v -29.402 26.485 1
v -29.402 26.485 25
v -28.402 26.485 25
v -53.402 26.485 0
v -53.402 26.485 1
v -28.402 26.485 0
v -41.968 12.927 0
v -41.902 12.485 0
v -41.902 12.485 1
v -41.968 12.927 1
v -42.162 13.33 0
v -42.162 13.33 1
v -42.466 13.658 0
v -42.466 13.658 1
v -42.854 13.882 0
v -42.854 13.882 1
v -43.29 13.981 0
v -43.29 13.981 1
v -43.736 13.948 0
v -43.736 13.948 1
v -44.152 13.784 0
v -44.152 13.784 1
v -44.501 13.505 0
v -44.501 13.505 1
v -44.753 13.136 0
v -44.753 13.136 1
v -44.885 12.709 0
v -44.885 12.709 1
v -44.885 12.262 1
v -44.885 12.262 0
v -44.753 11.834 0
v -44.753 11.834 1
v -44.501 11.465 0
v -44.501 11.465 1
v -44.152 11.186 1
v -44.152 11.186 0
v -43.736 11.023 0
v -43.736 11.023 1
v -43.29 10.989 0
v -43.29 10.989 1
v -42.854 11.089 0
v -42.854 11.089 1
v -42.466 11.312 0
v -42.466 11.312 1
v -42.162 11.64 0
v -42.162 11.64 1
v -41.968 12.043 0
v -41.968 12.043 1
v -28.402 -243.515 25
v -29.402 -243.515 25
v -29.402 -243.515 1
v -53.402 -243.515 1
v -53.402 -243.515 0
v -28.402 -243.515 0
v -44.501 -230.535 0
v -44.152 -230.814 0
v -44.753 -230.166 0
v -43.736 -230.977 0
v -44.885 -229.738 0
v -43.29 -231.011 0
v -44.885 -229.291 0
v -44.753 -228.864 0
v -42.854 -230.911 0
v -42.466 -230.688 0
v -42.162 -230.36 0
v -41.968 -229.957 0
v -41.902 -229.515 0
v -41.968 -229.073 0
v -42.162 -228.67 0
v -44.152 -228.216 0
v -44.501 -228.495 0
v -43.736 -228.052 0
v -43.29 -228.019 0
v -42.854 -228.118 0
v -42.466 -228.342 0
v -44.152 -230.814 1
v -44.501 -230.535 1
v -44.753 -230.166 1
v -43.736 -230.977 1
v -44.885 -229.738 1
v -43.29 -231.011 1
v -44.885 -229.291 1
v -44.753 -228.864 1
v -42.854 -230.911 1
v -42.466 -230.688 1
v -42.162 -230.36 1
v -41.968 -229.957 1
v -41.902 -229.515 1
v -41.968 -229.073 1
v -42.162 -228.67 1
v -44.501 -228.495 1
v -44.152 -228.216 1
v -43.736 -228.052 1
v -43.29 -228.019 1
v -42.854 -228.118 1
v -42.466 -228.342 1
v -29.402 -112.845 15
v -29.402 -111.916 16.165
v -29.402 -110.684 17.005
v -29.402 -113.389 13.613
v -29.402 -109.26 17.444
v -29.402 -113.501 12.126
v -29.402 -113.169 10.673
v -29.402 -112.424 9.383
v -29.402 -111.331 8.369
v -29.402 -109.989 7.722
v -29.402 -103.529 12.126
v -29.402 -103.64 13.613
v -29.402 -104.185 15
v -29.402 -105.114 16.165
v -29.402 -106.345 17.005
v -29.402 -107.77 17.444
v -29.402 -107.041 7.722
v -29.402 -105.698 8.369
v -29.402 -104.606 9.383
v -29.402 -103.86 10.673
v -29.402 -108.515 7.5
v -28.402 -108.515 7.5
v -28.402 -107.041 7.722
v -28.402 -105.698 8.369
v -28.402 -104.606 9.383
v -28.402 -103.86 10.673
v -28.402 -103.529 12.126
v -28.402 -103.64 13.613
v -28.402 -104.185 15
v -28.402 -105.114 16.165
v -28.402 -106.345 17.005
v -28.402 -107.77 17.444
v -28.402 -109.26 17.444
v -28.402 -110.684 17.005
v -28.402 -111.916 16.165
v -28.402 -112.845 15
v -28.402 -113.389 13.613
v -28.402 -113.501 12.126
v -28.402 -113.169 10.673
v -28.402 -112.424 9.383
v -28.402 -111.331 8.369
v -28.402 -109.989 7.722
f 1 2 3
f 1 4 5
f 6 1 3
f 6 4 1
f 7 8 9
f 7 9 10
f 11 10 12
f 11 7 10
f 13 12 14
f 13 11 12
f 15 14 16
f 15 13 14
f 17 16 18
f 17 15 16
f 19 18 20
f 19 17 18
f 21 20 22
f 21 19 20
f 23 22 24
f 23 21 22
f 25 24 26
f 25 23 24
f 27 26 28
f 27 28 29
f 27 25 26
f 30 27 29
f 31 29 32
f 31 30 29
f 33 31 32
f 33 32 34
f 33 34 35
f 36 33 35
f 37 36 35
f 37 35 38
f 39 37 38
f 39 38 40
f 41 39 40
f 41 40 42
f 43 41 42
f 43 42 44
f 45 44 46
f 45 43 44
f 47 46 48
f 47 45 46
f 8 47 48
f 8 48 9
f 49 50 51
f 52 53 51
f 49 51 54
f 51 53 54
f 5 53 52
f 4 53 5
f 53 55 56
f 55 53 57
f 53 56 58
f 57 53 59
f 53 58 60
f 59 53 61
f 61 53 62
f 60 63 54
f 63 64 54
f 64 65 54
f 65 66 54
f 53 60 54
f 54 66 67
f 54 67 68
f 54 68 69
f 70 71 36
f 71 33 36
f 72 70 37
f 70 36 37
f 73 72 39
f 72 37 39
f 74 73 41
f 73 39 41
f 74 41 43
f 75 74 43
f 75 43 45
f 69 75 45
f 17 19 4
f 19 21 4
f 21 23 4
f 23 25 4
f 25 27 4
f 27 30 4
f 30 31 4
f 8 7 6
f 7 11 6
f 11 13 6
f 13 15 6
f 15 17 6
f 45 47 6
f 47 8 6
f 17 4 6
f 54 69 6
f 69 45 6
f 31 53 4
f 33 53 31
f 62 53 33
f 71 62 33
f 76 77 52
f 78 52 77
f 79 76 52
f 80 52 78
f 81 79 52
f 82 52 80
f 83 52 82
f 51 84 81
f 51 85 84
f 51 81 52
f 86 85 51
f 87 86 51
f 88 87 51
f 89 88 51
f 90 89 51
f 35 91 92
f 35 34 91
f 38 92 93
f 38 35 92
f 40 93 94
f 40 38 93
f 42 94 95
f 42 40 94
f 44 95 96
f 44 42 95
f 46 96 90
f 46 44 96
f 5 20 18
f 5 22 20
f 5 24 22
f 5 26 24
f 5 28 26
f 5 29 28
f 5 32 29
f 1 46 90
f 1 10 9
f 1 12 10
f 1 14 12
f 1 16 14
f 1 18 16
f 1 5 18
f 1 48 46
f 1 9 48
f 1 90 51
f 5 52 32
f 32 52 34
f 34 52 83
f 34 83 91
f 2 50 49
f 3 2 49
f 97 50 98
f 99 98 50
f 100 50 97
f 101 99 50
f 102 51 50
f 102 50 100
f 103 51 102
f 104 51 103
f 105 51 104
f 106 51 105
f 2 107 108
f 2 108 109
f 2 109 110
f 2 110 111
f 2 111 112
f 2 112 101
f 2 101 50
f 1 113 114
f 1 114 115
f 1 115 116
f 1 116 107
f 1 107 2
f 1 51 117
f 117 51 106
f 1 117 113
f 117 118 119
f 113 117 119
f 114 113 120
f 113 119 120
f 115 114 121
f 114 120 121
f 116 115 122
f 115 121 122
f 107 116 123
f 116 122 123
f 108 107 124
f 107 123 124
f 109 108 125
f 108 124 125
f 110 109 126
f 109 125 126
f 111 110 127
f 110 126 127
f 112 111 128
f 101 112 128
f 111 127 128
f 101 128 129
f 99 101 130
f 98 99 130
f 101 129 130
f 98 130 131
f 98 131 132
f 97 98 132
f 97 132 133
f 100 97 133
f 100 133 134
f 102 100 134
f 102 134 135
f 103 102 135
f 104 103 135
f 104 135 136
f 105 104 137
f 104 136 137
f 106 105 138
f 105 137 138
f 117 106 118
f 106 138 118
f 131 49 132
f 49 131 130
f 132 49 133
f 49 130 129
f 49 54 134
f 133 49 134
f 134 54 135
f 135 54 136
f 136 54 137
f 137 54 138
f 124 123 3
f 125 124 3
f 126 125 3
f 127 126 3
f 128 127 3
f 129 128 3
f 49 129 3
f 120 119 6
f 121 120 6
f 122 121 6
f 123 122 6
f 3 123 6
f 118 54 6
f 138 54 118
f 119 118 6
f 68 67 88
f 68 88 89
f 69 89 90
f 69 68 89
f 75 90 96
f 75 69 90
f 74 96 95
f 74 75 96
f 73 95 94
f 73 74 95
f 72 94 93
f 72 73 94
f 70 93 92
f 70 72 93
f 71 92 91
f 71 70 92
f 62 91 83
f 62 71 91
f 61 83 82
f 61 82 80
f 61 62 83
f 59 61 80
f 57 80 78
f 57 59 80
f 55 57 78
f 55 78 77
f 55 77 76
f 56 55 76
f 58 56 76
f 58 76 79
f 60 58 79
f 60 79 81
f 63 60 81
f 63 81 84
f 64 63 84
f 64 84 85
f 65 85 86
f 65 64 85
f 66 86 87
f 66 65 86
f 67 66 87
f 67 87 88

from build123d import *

# Parameters (mm, degrees)
CROQUIS1_W              = 24
CROQUIS1_H              = 270
CROQUIS1_R              = 1.5
SALIENTE_EXTRUIR1_DEPTH = 1
CROQUIS2_W              = 1
CROQUIS2_H              = 270
SALIENTE_EXTRUIR2_DEPTH = 25
CROQUIS3_R              = 5
CORTAR_EXTRUIR1_DEPTH   = 1


with BuildPart() as part:
    # Croquis1 → Saliente-Extruir1 (new body)
    with BuildSketch(Plane.XY):
        with Locations((-41.401725042, -108.514805415)):
            Rectangle(CROQUIS1_W, CROQUIS1_H)
        with Locations((-43.401725042, 12.485194585)):
            Circle(CROQUIS1_R, mode=Mode.SUBTRACT)
        with Locations((-43.401725042, -229.514805415)):
            Circle(CROQUIS1_R, mode=Mode.SUBTRACT)
    extrude(amount=SALIENTE_EXTRUIR1_DEPTH)

    # Croquis2 → Saliente-Extruir2 (add)
    with BuildSketch(Plane.XY):
        with Locations((-28.901725042, -108.514805415)):
            Rectangle(CROQUIS2_W, CROQUIS2_H)
    extrude(amount=SALIENTE_EXTRUIR2_DEPTH)

    # Croquis3 → Cortar-Extruir1 (cut)
    with BuildSketch(Plane(origin=(-28.401725042, 0, 0), x_dir=(0, 0, -1), z_dir=(1, 0, 0))):
        with Locations((-12.5, -108.514805415)):
            Circle(CROQUIS3_R)
    extrude(amount=-CORTAR_EXTRUIR1_DEPTH, mode=Mode.SUBTRACT)


solid = part.part
